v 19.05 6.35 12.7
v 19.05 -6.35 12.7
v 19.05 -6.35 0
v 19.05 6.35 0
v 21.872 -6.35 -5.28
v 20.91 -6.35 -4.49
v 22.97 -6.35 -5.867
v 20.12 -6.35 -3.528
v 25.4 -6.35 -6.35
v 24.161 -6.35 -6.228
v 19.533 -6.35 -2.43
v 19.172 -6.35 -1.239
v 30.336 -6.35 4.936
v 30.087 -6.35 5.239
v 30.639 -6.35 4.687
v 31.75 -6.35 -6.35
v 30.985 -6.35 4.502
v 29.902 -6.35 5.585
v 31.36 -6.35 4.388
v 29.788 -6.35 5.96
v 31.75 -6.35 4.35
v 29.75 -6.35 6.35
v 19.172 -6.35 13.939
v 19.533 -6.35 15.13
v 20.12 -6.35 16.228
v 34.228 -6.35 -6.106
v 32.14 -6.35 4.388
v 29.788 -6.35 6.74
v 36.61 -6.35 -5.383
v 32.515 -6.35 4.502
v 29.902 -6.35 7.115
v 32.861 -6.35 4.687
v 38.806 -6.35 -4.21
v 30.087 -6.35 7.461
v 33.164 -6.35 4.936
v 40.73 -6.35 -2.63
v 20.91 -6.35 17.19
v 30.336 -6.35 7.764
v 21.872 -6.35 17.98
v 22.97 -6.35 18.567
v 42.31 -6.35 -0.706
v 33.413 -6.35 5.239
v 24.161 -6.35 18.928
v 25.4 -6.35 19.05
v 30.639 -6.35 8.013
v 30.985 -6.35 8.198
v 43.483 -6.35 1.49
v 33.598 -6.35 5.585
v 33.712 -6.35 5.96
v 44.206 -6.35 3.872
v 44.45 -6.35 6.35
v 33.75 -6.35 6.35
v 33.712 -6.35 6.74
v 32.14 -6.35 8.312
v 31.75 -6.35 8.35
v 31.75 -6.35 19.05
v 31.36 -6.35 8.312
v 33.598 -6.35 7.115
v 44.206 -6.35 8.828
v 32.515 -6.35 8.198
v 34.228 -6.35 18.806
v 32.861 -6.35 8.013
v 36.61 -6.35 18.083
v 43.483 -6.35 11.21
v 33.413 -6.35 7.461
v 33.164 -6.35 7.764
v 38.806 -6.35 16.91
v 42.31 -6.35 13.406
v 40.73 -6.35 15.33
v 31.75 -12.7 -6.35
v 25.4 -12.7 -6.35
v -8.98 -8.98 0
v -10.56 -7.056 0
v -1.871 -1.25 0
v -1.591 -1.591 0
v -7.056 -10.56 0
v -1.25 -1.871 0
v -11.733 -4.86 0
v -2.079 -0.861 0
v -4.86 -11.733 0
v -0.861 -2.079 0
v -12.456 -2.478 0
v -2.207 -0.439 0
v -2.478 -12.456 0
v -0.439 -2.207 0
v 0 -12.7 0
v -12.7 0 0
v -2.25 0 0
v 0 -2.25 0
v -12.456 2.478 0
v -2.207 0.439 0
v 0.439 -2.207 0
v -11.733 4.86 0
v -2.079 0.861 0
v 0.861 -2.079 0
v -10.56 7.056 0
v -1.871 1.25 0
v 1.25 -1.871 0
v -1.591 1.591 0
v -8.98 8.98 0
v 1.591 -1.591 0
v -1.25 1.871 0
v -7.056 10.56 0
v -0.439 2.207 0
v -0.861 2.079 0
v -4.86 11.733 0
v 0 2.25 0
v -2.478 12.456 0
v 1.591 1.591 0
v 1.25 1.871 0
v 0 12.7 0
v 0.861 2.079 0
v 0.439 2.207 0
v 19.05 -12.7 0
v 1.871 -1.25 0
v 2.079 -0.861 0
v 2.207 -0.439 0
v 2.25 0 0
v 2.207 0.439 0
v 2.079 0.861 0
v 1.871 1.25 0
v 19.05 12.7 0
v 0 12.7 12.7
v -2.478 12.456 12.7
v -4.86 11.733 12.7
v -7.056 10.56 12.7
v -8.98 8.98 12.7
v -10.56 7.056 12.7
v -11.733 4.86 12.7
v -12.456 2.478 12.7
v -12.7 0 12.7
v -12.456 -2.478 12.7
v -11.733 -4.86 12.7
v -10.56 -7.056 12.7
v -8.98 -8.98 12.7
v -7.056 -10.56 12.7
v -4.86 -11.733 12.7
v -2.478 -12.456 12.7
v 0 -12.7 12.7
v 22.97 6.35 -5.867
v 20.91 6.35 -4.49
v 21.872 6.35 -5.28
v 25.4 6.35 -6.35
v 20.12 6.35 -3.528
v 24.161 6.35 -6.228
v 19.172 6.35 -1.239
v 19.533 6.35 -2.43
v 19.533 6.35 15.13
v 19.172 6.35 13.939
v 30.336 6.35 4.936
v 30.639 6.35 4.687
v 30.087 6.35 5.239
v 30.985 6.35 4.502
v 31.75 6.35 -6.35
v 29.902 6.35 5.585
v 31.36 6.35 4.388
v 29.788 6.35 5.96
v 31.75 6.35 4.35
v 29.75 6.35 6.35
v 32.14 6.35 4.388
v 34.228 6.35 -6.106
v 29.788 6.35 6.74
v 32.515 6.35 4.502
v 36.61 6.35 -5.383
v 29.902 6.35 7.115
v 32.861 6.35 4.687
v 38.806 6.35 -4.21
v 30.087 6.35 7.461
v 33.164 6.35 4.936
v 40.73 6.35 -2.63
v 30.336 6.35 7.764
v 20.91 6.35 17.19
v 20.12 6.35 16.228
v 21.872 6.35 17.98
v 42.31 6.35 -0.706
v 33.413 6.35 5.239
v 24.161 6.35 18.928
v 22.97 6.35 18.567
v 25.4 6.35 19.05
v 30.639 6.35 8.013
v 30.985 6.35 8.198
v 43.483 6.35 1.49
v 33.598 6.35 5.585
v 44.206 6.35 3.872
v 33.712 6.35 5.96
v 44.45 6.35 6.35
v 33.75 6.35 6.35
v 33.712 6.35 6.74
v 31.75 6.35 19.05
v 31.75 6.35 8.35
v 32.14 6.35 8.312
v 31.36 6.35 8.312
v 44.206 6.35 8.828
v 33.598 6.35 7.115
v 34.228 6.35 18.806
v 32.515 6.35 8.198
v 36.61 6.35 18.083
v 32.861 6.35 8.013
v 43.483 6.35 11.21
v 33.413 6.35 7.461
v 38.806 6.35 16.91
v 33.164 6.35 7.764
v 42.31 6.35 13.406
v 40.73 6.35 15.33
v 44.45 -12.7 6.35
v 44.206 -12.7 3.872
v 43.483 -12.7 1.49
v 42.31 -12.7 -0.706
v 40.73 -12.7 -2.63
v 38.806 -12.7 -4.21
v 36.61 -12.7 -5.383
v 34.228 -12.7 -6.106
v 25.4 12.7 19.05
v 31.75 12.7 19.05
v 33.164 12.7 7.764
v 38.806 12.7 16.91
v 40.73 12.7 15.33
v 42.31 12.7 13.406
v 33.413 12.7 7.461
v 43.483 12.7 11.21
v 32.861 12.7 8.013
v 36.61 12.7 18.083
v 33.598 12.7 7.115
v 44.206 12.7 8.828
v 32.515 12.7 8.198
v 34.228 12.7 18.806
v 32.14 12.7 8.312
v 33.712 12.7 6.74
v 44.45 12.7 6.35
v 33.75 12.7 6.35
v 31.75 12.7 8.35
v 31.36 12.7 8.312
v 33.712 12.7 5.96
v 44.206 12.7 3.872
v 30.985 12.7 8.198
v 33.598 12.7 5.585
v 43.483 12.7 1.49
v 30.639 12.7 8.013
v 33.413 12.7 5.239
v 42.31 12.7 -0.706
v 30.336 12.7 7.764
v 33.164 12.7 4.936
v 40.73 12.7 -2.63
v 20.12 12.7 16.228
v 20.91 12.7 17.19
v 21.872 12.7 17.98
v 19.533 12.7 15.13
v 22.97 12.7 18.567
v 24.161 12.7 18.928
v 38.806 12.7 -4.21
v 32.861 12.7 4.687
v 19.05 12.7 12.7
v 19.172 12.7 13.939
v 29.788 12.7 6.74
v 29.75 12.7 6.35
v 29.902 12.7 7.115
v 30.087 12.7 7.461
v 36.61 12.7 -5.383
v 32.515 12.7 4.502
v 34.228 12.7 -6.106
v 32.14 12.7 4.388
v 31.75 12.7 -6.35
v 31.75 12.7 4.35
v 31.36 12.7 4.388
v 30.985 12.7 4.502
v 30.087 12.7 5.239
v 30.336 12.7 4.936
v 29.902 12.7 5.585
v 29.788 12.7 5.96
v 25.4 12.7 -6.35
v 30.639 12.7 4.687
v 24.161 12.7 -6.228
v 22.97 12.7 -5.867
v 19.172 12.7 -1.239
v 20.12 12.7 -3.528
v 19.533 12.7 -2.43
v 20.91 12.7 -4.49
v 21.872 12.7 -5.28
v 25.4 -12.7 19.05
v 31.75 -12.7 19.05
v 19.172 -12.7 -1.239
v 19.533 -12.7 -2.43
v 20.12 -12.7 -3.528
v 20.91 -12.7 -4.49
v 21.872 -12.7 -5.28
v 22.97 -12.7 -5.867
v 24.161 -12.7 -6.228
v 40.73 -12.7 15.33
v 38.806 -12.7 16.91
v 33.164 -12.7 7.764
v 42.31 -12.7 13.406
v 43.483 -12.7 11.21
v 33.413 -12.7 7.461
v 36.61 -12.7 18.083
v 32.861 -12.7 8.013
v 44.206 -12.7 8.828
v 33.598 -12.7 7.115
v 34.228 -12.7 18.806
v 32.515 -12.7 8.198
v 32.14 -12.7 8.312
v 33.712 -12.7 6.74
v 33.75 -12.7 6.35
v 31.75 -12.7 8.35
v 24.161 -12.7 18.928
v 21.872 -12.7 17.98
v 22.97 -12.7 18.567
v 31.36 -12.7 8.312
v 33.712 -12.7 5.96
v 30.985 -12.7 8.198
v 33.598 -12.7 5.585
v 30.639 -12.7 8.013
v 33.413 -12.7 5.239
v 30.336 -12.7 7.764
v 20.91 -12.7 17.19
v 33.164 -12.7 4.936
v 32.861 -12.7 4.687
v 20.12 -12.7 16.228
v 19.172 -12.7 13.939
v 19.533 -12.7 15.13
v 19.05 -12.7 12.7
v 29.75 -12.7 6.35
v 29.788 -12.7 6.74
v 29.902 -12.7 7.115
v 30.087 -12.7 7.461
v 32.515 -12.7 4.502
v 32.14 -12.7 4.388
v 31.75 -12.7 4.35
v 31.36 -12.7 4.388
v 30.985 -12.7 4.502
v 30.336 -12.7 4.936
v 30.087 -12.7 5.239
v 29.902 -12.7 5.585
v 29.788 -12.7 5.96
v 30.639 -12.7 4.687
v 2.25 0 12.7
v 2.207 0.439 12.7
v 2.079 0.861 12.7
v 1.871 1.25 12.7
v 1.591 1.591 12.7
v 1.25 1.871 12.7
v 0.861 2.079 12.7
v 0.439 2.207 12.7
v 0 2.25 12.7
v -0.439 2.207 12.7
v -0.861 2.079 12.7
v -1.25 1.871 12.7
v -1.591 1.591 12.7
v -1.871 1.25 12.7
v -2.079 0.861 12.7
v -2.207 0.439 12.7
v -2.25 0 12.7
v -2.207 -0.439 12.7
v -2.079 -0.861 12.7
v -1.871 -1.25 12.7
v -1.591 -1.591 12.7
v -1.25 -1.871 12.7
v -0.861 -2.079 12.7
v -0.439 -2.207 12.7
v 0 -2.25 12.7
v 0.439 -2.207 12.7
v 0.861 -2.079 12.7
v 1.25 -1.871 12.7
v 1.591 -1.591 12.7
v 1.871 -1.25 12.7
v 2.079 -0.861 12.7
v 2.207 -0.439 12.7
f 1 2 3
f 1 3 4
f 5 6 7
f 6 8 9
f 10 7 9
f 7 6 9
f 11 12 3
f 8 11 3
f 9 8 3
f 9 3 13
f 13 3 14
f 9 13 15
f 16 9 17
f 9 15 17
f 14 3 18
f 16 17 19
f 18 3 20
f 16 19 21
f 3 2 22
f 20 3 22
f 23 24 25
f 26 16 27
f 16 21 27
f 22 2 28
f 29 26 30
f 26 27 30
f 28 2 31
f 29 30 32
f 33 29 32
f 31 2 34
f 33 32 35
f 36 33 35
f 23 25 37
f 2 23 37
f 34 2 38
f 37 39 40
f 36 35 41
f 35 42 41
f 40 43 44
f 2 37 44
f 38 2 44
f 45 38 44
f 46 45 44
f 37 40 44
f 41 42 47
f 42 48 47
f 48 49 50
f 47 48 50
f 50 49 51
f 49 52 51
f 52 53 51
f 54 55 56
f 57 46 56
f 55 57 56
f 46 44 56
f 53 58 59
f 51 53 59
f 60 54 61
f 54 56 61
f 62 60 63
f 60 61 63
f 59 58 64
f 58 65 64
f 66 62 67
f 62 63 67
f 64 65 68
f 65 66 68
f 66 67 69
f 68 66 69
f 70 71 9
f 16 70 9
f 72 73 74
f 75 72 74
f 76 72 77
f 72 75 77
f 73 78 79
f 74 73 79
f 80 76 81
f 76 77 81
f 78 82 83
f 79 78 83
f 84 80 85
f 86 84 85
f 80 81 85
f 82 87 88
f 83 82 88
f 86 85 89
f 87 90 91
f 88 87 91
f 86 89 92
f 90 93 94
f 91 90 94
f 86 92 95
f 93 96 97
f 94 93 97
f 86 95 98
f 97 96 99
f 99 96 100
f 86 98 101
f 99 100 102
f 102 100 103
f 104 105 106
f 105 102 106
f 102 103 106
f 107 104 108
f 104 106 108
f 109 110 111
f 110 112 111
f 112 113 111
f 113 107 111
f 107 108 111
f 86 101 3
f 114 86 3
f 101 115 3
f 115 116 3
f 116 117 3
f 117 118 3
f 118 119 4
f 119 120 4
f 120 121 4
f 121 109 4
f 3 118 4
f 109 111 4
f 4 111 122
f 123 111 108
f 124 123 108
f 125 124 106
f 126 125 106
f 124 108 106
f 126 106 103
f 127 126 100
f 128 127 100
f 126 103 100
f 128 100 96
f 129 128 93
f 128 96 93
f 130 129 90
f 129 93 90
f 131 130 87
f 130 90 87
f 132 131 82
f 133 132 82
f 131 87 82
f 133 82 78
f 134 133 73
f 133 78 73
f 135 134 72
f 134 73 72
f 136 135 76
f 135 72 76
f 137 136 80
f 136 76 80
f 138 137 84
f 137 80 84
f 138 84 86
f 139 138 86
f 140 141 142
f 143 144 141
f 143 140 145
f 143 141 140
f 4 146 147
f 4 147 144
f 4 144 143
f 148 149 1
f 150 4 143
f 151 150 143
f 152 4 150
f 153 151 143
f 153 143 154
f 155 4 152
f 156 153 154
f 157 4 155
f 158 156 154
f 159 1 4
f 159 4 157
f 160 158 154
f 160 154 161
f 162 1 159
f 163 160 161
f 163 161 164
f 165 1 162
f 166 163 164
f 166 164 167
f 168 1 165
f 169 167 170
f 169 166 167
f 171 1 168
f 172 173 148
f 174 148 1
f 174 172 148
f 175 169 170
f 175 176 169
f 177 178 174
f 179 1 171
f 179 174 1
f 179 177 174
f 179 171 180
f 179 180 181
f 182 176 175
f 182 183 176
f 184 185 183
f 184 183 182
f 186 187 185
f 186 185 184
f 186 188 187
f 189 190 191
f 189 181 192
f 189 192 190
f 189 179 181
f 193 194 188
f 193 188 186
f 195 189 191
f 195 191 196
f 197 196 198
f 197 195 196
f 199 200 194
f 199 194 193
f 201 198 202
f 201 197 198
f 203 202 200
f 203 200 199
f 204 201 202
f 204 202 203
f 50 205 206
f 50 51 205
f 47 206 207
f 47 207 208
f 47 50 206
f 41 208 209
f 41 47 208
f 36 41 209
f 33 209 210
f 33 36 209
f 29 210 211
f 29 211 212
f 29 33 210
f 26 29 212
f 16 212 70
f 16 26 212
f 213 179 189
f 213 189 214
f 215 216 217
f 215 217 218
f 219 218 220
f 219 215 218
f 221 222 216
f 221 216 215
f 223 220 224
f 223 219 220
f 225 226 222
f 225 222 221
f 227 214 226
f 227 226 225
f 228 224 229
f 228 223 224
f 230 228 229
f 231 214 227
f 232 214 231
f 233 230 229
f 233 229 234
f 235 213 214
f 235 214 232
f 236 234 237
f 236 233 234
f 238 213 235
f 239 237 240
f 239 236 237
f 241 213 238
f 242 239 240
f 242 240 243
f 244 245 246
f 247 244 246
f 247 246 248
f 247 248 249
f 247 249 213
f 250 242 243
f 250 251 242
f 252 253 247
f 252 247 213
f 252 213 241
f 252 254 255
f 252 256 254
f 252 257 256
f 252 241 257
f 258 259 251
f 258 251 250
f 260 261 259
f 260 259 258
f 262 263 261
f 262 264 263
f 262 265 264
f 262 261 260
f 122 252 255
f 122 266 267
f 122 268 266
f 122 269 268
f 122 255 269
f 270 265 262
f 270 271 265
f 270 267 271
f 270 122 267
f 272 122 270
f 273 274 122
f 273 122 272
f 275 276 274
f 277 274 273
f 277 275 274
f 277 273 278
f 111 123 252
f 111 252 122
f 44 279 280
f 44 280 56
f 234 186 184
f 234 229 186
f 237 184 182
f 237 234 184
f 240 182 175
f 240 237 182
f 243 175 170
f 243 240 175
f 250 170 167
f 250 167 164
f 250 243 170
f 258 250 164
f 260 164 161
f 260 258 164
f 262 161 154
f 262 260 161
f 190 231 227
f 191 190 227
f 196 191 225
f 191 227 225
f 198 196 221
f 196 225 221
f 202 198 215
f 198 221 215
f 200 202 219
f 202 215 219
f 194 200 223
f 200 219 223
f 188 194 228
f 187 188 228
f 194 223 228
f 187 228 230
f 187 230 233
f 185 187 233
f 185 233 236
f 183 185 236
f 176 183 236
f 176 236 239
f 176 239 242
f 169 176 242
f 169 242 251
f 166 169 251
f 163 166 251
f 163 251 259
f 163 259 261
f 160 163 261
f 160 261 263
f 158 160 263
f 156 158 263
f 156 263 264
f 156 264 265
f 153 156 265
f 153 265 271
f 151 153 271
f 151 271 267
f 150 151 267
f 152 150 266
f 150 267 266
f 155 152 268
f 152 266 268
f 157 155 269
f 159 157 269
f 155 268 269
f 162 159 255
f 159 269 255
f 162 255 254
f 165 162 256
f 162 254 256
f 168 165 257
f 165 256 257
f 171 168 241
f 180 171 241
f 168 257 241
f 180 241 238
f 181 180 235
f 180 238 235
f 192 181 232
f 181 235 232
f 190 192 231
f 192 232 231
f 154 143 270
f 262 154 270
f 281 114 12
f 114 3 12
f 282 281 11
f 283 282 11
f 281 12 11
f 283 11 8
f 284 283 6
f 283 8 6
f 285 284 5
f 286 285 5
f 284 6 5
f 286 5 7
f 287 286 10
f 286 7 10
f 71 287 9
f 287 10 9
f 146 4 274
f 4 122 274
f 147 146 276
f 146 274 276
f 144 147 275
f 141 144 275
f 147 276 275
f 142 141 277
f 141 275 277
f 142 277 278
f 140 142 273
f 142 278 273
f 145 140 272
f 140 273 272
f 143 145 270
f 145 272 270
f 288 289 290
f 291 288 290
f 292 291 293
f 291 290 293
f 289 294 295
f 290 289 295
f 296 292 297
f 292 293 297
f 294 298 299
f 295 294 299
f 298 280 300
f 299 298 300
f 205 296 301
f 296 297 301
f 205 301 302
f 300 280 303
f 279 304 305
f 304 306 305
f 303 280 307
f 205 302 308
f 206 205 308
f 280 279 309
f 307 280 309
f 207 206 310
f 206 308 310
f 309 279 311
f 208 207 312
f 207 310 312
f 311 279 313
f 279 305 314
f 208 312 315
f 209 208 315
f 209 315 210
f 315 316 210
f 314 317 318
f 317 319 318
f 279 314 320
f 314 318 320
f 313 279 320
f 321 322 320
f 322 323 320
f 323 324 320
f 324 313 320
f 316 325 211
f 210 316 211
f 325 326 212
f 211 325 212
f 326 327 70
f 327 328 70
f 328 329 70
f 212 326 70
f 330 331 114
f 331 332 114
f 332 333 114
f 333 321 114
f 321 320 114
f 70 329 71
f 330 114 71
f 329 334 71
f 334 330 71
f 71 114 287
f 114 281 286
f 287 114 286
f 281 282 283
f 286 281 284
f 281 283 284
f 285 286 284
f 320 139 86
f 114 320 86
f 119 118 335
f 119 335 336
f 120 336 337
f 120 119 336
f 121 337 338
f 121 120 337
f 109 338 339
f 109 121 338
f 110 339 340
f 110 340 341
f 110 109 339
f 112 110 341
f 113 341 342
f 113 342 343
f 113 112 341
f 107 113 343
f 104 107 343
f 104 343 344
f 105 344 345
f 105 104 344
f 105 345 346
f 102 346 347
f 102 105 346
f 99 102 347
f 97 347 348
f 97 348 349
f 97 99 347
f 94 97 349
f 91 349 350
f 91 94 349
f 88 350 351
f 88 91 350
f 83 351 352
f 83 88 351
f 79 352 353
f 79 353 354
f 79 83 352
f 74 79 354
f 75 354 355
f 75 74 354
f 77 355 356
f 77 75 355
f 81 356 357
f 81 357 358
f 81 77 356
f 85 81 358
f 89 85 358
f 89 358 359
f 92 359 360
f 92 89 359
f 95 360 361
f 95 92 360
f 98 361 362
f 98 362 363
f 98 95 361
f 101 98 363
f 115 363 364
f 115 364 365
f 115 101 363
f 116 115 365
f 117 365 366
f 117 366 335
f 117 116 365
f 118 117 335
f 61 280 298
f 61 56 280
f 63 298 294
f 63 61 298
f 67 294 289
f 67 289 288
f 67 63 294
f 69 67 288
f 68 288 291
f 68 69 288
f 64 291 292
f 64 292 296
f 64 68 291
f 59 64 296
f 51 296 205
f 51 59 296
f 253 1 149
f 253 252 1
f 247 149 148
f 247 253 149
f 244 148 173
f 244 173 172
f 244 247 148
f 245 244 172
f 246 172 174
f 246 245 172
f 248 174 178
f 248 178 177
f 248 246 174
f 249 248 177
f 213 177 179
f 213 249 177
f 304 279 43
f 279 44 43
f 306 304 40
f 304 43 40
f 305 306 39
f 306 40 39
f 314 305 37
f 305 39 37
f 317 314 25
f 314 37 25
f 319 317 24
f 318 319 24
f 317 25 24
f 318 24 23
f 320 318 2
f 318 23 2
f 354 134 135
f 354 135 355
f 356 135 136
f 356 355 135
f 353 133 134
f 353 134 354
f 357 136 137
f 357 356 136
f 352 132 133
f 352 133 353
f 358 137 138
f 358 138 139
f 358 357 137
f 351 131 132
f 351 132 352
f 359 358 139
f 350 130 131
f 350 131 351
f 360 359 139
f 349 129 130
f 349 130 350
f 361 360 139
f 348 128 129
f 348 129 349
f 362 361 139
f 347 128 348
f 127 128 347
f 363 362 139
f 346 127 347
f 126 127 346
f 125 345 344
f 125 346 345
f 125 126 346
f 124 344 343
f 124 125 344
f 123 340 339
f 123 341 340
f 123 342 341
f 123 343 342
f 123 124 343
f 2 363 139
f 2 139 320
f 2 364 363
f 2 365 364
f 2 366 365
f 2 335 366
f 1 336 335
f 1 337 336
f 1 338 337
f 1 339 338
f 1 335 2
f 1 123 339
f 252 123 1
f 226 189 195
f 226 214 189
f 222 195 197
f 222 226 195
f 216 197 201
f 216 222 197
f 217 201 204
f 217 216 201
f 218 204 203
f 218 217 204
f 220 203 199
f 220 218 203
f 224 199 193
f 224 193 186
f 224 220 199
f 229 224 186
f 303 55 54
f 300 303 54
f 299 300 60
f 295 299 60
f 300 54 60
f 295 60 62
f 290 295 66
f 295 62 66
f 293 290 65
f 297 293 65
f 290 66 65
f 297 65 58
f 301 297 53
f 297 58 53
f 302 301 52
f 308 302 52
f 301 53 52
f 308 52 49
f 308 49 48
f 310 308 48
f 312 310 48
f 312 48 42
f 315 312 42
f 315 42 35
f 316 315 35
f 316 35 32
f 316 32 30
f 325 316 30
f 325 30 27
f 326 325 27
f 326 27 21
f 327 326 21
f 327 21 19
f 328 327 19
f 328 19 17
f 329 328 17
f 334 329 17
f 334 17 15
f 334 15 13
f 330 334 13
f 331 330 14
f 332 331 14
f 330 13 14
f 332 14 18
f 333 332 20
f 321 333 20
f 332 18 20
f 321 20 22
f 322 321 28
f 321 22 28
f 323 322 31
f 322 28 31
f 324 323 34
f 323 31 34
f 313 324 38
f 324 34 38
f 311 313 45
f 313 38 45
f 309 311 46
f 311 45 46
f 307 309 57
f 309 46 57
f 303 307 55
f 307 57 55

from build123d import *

# Parameters (mm, degrees)
SKETCH1_R           = 2.25
BOSS_EXTRUDE1_DEPTH = 12.7
SKETCH2_W           = 25.4
SKETCH2_H           = 25.4
BOSS_EXTRUDE2_DEPTH = 25.4
SKETCH3_W           = 25.4
SKETCH3_H           = 12.7
CUT_EXTRUDE1_DEPTH  = 25.4
FILLET2_R           = 6.35
FILLET3_R           = 12.7
SKETCH4_R           = 2
CUT_EXTRUDE2_DEPTH  = 25.4


with BuildPart() as part:
    # Sketch1 → Boss-Extrude1 (new body)
    with BuildSketch(Plane.XY):
        with BuildLine():
            Line((19.05, 12.7), (0, 12.7))
            ThreePointArc((0, 12.7), (-12.7, 0), (0, -12.7))
            Line((0, -12.7), (19.05, -12.7))
            Line((19.05, -12.7), (19.05, 12.7))
        make_face()
        Circle(SKETCH1_R, mode=Mode.SUBTRACT)
    extrude(amount=BOSS_EXTRUDE1_DEPTH)

    # Sketch2 → Boss-Extrude2 (add)
    with BuildSketch(Plane(origin=(19.05, 0, 0), x_dir=(0, 0, -1), z_dir=(1, 0, 0))):
        with Locations((-6.35, 0)):
            Rectangle(SKETCH2_W, SKETCH2_H)
    extrude(amount=BOSS_EXTRUDE2_DEPTH)

    # Sketch3 → Cut-Extrude1 (cut)
    with BuildSketch(Plane.XY.offset(19.05)):
        with Locations((31.75, 0)):
            Rectangle(SKETCH3_W, SKETCH3_H)
    extrude(amount=-CUT_EXTRUDE1_DEPTH, mode=Mode.SUBTRACT)

    # Fillet2
    fillet2_edges = [part.edges().sort_by_distance(p)[0] for p in [
        (19.05, 9.525, 19.05),
        (19.05, -9.525, 19.05),
        (19.05, -9.525, -6.35),
        (19.05, 9.525, -6.35),
    ]]
    fillet(fillet2_edges, radius=FILLET2_R - 0.0001)  # a hair under: the kernel refuses the full size

    # Fillet3
    fillet3_edges = [part.edges().sort_by_distance(p)[0] for p in [
        (44.45, 9.525, 19.05),
        (44.45, -9.525, 19.05),
        (44.45, 9.525, -6.35),
        (44.45, -9.525, -6.35),
    ]]
    fillet(fillet3_edges, radius=FILLET3_R - 0.0001)  # a hair under: the kernel refuses the full size

    # Sketch4 → Cut-Extrude2 (cut)
    with BuildSketch(Plane(origin=(0, 12.7, 0), x_dir=(1, 0, 0), z_dir=(0, 1, 0))):
        with Locations(Location((31.75, -6.35, 0), (0, 0, 270))):
            Circle(SKETCH4_R)
    extrude(amount=-CUT_EXTRUDE2_DEPTH, mode=Mode.SUBTRACT)


solid = part.part
